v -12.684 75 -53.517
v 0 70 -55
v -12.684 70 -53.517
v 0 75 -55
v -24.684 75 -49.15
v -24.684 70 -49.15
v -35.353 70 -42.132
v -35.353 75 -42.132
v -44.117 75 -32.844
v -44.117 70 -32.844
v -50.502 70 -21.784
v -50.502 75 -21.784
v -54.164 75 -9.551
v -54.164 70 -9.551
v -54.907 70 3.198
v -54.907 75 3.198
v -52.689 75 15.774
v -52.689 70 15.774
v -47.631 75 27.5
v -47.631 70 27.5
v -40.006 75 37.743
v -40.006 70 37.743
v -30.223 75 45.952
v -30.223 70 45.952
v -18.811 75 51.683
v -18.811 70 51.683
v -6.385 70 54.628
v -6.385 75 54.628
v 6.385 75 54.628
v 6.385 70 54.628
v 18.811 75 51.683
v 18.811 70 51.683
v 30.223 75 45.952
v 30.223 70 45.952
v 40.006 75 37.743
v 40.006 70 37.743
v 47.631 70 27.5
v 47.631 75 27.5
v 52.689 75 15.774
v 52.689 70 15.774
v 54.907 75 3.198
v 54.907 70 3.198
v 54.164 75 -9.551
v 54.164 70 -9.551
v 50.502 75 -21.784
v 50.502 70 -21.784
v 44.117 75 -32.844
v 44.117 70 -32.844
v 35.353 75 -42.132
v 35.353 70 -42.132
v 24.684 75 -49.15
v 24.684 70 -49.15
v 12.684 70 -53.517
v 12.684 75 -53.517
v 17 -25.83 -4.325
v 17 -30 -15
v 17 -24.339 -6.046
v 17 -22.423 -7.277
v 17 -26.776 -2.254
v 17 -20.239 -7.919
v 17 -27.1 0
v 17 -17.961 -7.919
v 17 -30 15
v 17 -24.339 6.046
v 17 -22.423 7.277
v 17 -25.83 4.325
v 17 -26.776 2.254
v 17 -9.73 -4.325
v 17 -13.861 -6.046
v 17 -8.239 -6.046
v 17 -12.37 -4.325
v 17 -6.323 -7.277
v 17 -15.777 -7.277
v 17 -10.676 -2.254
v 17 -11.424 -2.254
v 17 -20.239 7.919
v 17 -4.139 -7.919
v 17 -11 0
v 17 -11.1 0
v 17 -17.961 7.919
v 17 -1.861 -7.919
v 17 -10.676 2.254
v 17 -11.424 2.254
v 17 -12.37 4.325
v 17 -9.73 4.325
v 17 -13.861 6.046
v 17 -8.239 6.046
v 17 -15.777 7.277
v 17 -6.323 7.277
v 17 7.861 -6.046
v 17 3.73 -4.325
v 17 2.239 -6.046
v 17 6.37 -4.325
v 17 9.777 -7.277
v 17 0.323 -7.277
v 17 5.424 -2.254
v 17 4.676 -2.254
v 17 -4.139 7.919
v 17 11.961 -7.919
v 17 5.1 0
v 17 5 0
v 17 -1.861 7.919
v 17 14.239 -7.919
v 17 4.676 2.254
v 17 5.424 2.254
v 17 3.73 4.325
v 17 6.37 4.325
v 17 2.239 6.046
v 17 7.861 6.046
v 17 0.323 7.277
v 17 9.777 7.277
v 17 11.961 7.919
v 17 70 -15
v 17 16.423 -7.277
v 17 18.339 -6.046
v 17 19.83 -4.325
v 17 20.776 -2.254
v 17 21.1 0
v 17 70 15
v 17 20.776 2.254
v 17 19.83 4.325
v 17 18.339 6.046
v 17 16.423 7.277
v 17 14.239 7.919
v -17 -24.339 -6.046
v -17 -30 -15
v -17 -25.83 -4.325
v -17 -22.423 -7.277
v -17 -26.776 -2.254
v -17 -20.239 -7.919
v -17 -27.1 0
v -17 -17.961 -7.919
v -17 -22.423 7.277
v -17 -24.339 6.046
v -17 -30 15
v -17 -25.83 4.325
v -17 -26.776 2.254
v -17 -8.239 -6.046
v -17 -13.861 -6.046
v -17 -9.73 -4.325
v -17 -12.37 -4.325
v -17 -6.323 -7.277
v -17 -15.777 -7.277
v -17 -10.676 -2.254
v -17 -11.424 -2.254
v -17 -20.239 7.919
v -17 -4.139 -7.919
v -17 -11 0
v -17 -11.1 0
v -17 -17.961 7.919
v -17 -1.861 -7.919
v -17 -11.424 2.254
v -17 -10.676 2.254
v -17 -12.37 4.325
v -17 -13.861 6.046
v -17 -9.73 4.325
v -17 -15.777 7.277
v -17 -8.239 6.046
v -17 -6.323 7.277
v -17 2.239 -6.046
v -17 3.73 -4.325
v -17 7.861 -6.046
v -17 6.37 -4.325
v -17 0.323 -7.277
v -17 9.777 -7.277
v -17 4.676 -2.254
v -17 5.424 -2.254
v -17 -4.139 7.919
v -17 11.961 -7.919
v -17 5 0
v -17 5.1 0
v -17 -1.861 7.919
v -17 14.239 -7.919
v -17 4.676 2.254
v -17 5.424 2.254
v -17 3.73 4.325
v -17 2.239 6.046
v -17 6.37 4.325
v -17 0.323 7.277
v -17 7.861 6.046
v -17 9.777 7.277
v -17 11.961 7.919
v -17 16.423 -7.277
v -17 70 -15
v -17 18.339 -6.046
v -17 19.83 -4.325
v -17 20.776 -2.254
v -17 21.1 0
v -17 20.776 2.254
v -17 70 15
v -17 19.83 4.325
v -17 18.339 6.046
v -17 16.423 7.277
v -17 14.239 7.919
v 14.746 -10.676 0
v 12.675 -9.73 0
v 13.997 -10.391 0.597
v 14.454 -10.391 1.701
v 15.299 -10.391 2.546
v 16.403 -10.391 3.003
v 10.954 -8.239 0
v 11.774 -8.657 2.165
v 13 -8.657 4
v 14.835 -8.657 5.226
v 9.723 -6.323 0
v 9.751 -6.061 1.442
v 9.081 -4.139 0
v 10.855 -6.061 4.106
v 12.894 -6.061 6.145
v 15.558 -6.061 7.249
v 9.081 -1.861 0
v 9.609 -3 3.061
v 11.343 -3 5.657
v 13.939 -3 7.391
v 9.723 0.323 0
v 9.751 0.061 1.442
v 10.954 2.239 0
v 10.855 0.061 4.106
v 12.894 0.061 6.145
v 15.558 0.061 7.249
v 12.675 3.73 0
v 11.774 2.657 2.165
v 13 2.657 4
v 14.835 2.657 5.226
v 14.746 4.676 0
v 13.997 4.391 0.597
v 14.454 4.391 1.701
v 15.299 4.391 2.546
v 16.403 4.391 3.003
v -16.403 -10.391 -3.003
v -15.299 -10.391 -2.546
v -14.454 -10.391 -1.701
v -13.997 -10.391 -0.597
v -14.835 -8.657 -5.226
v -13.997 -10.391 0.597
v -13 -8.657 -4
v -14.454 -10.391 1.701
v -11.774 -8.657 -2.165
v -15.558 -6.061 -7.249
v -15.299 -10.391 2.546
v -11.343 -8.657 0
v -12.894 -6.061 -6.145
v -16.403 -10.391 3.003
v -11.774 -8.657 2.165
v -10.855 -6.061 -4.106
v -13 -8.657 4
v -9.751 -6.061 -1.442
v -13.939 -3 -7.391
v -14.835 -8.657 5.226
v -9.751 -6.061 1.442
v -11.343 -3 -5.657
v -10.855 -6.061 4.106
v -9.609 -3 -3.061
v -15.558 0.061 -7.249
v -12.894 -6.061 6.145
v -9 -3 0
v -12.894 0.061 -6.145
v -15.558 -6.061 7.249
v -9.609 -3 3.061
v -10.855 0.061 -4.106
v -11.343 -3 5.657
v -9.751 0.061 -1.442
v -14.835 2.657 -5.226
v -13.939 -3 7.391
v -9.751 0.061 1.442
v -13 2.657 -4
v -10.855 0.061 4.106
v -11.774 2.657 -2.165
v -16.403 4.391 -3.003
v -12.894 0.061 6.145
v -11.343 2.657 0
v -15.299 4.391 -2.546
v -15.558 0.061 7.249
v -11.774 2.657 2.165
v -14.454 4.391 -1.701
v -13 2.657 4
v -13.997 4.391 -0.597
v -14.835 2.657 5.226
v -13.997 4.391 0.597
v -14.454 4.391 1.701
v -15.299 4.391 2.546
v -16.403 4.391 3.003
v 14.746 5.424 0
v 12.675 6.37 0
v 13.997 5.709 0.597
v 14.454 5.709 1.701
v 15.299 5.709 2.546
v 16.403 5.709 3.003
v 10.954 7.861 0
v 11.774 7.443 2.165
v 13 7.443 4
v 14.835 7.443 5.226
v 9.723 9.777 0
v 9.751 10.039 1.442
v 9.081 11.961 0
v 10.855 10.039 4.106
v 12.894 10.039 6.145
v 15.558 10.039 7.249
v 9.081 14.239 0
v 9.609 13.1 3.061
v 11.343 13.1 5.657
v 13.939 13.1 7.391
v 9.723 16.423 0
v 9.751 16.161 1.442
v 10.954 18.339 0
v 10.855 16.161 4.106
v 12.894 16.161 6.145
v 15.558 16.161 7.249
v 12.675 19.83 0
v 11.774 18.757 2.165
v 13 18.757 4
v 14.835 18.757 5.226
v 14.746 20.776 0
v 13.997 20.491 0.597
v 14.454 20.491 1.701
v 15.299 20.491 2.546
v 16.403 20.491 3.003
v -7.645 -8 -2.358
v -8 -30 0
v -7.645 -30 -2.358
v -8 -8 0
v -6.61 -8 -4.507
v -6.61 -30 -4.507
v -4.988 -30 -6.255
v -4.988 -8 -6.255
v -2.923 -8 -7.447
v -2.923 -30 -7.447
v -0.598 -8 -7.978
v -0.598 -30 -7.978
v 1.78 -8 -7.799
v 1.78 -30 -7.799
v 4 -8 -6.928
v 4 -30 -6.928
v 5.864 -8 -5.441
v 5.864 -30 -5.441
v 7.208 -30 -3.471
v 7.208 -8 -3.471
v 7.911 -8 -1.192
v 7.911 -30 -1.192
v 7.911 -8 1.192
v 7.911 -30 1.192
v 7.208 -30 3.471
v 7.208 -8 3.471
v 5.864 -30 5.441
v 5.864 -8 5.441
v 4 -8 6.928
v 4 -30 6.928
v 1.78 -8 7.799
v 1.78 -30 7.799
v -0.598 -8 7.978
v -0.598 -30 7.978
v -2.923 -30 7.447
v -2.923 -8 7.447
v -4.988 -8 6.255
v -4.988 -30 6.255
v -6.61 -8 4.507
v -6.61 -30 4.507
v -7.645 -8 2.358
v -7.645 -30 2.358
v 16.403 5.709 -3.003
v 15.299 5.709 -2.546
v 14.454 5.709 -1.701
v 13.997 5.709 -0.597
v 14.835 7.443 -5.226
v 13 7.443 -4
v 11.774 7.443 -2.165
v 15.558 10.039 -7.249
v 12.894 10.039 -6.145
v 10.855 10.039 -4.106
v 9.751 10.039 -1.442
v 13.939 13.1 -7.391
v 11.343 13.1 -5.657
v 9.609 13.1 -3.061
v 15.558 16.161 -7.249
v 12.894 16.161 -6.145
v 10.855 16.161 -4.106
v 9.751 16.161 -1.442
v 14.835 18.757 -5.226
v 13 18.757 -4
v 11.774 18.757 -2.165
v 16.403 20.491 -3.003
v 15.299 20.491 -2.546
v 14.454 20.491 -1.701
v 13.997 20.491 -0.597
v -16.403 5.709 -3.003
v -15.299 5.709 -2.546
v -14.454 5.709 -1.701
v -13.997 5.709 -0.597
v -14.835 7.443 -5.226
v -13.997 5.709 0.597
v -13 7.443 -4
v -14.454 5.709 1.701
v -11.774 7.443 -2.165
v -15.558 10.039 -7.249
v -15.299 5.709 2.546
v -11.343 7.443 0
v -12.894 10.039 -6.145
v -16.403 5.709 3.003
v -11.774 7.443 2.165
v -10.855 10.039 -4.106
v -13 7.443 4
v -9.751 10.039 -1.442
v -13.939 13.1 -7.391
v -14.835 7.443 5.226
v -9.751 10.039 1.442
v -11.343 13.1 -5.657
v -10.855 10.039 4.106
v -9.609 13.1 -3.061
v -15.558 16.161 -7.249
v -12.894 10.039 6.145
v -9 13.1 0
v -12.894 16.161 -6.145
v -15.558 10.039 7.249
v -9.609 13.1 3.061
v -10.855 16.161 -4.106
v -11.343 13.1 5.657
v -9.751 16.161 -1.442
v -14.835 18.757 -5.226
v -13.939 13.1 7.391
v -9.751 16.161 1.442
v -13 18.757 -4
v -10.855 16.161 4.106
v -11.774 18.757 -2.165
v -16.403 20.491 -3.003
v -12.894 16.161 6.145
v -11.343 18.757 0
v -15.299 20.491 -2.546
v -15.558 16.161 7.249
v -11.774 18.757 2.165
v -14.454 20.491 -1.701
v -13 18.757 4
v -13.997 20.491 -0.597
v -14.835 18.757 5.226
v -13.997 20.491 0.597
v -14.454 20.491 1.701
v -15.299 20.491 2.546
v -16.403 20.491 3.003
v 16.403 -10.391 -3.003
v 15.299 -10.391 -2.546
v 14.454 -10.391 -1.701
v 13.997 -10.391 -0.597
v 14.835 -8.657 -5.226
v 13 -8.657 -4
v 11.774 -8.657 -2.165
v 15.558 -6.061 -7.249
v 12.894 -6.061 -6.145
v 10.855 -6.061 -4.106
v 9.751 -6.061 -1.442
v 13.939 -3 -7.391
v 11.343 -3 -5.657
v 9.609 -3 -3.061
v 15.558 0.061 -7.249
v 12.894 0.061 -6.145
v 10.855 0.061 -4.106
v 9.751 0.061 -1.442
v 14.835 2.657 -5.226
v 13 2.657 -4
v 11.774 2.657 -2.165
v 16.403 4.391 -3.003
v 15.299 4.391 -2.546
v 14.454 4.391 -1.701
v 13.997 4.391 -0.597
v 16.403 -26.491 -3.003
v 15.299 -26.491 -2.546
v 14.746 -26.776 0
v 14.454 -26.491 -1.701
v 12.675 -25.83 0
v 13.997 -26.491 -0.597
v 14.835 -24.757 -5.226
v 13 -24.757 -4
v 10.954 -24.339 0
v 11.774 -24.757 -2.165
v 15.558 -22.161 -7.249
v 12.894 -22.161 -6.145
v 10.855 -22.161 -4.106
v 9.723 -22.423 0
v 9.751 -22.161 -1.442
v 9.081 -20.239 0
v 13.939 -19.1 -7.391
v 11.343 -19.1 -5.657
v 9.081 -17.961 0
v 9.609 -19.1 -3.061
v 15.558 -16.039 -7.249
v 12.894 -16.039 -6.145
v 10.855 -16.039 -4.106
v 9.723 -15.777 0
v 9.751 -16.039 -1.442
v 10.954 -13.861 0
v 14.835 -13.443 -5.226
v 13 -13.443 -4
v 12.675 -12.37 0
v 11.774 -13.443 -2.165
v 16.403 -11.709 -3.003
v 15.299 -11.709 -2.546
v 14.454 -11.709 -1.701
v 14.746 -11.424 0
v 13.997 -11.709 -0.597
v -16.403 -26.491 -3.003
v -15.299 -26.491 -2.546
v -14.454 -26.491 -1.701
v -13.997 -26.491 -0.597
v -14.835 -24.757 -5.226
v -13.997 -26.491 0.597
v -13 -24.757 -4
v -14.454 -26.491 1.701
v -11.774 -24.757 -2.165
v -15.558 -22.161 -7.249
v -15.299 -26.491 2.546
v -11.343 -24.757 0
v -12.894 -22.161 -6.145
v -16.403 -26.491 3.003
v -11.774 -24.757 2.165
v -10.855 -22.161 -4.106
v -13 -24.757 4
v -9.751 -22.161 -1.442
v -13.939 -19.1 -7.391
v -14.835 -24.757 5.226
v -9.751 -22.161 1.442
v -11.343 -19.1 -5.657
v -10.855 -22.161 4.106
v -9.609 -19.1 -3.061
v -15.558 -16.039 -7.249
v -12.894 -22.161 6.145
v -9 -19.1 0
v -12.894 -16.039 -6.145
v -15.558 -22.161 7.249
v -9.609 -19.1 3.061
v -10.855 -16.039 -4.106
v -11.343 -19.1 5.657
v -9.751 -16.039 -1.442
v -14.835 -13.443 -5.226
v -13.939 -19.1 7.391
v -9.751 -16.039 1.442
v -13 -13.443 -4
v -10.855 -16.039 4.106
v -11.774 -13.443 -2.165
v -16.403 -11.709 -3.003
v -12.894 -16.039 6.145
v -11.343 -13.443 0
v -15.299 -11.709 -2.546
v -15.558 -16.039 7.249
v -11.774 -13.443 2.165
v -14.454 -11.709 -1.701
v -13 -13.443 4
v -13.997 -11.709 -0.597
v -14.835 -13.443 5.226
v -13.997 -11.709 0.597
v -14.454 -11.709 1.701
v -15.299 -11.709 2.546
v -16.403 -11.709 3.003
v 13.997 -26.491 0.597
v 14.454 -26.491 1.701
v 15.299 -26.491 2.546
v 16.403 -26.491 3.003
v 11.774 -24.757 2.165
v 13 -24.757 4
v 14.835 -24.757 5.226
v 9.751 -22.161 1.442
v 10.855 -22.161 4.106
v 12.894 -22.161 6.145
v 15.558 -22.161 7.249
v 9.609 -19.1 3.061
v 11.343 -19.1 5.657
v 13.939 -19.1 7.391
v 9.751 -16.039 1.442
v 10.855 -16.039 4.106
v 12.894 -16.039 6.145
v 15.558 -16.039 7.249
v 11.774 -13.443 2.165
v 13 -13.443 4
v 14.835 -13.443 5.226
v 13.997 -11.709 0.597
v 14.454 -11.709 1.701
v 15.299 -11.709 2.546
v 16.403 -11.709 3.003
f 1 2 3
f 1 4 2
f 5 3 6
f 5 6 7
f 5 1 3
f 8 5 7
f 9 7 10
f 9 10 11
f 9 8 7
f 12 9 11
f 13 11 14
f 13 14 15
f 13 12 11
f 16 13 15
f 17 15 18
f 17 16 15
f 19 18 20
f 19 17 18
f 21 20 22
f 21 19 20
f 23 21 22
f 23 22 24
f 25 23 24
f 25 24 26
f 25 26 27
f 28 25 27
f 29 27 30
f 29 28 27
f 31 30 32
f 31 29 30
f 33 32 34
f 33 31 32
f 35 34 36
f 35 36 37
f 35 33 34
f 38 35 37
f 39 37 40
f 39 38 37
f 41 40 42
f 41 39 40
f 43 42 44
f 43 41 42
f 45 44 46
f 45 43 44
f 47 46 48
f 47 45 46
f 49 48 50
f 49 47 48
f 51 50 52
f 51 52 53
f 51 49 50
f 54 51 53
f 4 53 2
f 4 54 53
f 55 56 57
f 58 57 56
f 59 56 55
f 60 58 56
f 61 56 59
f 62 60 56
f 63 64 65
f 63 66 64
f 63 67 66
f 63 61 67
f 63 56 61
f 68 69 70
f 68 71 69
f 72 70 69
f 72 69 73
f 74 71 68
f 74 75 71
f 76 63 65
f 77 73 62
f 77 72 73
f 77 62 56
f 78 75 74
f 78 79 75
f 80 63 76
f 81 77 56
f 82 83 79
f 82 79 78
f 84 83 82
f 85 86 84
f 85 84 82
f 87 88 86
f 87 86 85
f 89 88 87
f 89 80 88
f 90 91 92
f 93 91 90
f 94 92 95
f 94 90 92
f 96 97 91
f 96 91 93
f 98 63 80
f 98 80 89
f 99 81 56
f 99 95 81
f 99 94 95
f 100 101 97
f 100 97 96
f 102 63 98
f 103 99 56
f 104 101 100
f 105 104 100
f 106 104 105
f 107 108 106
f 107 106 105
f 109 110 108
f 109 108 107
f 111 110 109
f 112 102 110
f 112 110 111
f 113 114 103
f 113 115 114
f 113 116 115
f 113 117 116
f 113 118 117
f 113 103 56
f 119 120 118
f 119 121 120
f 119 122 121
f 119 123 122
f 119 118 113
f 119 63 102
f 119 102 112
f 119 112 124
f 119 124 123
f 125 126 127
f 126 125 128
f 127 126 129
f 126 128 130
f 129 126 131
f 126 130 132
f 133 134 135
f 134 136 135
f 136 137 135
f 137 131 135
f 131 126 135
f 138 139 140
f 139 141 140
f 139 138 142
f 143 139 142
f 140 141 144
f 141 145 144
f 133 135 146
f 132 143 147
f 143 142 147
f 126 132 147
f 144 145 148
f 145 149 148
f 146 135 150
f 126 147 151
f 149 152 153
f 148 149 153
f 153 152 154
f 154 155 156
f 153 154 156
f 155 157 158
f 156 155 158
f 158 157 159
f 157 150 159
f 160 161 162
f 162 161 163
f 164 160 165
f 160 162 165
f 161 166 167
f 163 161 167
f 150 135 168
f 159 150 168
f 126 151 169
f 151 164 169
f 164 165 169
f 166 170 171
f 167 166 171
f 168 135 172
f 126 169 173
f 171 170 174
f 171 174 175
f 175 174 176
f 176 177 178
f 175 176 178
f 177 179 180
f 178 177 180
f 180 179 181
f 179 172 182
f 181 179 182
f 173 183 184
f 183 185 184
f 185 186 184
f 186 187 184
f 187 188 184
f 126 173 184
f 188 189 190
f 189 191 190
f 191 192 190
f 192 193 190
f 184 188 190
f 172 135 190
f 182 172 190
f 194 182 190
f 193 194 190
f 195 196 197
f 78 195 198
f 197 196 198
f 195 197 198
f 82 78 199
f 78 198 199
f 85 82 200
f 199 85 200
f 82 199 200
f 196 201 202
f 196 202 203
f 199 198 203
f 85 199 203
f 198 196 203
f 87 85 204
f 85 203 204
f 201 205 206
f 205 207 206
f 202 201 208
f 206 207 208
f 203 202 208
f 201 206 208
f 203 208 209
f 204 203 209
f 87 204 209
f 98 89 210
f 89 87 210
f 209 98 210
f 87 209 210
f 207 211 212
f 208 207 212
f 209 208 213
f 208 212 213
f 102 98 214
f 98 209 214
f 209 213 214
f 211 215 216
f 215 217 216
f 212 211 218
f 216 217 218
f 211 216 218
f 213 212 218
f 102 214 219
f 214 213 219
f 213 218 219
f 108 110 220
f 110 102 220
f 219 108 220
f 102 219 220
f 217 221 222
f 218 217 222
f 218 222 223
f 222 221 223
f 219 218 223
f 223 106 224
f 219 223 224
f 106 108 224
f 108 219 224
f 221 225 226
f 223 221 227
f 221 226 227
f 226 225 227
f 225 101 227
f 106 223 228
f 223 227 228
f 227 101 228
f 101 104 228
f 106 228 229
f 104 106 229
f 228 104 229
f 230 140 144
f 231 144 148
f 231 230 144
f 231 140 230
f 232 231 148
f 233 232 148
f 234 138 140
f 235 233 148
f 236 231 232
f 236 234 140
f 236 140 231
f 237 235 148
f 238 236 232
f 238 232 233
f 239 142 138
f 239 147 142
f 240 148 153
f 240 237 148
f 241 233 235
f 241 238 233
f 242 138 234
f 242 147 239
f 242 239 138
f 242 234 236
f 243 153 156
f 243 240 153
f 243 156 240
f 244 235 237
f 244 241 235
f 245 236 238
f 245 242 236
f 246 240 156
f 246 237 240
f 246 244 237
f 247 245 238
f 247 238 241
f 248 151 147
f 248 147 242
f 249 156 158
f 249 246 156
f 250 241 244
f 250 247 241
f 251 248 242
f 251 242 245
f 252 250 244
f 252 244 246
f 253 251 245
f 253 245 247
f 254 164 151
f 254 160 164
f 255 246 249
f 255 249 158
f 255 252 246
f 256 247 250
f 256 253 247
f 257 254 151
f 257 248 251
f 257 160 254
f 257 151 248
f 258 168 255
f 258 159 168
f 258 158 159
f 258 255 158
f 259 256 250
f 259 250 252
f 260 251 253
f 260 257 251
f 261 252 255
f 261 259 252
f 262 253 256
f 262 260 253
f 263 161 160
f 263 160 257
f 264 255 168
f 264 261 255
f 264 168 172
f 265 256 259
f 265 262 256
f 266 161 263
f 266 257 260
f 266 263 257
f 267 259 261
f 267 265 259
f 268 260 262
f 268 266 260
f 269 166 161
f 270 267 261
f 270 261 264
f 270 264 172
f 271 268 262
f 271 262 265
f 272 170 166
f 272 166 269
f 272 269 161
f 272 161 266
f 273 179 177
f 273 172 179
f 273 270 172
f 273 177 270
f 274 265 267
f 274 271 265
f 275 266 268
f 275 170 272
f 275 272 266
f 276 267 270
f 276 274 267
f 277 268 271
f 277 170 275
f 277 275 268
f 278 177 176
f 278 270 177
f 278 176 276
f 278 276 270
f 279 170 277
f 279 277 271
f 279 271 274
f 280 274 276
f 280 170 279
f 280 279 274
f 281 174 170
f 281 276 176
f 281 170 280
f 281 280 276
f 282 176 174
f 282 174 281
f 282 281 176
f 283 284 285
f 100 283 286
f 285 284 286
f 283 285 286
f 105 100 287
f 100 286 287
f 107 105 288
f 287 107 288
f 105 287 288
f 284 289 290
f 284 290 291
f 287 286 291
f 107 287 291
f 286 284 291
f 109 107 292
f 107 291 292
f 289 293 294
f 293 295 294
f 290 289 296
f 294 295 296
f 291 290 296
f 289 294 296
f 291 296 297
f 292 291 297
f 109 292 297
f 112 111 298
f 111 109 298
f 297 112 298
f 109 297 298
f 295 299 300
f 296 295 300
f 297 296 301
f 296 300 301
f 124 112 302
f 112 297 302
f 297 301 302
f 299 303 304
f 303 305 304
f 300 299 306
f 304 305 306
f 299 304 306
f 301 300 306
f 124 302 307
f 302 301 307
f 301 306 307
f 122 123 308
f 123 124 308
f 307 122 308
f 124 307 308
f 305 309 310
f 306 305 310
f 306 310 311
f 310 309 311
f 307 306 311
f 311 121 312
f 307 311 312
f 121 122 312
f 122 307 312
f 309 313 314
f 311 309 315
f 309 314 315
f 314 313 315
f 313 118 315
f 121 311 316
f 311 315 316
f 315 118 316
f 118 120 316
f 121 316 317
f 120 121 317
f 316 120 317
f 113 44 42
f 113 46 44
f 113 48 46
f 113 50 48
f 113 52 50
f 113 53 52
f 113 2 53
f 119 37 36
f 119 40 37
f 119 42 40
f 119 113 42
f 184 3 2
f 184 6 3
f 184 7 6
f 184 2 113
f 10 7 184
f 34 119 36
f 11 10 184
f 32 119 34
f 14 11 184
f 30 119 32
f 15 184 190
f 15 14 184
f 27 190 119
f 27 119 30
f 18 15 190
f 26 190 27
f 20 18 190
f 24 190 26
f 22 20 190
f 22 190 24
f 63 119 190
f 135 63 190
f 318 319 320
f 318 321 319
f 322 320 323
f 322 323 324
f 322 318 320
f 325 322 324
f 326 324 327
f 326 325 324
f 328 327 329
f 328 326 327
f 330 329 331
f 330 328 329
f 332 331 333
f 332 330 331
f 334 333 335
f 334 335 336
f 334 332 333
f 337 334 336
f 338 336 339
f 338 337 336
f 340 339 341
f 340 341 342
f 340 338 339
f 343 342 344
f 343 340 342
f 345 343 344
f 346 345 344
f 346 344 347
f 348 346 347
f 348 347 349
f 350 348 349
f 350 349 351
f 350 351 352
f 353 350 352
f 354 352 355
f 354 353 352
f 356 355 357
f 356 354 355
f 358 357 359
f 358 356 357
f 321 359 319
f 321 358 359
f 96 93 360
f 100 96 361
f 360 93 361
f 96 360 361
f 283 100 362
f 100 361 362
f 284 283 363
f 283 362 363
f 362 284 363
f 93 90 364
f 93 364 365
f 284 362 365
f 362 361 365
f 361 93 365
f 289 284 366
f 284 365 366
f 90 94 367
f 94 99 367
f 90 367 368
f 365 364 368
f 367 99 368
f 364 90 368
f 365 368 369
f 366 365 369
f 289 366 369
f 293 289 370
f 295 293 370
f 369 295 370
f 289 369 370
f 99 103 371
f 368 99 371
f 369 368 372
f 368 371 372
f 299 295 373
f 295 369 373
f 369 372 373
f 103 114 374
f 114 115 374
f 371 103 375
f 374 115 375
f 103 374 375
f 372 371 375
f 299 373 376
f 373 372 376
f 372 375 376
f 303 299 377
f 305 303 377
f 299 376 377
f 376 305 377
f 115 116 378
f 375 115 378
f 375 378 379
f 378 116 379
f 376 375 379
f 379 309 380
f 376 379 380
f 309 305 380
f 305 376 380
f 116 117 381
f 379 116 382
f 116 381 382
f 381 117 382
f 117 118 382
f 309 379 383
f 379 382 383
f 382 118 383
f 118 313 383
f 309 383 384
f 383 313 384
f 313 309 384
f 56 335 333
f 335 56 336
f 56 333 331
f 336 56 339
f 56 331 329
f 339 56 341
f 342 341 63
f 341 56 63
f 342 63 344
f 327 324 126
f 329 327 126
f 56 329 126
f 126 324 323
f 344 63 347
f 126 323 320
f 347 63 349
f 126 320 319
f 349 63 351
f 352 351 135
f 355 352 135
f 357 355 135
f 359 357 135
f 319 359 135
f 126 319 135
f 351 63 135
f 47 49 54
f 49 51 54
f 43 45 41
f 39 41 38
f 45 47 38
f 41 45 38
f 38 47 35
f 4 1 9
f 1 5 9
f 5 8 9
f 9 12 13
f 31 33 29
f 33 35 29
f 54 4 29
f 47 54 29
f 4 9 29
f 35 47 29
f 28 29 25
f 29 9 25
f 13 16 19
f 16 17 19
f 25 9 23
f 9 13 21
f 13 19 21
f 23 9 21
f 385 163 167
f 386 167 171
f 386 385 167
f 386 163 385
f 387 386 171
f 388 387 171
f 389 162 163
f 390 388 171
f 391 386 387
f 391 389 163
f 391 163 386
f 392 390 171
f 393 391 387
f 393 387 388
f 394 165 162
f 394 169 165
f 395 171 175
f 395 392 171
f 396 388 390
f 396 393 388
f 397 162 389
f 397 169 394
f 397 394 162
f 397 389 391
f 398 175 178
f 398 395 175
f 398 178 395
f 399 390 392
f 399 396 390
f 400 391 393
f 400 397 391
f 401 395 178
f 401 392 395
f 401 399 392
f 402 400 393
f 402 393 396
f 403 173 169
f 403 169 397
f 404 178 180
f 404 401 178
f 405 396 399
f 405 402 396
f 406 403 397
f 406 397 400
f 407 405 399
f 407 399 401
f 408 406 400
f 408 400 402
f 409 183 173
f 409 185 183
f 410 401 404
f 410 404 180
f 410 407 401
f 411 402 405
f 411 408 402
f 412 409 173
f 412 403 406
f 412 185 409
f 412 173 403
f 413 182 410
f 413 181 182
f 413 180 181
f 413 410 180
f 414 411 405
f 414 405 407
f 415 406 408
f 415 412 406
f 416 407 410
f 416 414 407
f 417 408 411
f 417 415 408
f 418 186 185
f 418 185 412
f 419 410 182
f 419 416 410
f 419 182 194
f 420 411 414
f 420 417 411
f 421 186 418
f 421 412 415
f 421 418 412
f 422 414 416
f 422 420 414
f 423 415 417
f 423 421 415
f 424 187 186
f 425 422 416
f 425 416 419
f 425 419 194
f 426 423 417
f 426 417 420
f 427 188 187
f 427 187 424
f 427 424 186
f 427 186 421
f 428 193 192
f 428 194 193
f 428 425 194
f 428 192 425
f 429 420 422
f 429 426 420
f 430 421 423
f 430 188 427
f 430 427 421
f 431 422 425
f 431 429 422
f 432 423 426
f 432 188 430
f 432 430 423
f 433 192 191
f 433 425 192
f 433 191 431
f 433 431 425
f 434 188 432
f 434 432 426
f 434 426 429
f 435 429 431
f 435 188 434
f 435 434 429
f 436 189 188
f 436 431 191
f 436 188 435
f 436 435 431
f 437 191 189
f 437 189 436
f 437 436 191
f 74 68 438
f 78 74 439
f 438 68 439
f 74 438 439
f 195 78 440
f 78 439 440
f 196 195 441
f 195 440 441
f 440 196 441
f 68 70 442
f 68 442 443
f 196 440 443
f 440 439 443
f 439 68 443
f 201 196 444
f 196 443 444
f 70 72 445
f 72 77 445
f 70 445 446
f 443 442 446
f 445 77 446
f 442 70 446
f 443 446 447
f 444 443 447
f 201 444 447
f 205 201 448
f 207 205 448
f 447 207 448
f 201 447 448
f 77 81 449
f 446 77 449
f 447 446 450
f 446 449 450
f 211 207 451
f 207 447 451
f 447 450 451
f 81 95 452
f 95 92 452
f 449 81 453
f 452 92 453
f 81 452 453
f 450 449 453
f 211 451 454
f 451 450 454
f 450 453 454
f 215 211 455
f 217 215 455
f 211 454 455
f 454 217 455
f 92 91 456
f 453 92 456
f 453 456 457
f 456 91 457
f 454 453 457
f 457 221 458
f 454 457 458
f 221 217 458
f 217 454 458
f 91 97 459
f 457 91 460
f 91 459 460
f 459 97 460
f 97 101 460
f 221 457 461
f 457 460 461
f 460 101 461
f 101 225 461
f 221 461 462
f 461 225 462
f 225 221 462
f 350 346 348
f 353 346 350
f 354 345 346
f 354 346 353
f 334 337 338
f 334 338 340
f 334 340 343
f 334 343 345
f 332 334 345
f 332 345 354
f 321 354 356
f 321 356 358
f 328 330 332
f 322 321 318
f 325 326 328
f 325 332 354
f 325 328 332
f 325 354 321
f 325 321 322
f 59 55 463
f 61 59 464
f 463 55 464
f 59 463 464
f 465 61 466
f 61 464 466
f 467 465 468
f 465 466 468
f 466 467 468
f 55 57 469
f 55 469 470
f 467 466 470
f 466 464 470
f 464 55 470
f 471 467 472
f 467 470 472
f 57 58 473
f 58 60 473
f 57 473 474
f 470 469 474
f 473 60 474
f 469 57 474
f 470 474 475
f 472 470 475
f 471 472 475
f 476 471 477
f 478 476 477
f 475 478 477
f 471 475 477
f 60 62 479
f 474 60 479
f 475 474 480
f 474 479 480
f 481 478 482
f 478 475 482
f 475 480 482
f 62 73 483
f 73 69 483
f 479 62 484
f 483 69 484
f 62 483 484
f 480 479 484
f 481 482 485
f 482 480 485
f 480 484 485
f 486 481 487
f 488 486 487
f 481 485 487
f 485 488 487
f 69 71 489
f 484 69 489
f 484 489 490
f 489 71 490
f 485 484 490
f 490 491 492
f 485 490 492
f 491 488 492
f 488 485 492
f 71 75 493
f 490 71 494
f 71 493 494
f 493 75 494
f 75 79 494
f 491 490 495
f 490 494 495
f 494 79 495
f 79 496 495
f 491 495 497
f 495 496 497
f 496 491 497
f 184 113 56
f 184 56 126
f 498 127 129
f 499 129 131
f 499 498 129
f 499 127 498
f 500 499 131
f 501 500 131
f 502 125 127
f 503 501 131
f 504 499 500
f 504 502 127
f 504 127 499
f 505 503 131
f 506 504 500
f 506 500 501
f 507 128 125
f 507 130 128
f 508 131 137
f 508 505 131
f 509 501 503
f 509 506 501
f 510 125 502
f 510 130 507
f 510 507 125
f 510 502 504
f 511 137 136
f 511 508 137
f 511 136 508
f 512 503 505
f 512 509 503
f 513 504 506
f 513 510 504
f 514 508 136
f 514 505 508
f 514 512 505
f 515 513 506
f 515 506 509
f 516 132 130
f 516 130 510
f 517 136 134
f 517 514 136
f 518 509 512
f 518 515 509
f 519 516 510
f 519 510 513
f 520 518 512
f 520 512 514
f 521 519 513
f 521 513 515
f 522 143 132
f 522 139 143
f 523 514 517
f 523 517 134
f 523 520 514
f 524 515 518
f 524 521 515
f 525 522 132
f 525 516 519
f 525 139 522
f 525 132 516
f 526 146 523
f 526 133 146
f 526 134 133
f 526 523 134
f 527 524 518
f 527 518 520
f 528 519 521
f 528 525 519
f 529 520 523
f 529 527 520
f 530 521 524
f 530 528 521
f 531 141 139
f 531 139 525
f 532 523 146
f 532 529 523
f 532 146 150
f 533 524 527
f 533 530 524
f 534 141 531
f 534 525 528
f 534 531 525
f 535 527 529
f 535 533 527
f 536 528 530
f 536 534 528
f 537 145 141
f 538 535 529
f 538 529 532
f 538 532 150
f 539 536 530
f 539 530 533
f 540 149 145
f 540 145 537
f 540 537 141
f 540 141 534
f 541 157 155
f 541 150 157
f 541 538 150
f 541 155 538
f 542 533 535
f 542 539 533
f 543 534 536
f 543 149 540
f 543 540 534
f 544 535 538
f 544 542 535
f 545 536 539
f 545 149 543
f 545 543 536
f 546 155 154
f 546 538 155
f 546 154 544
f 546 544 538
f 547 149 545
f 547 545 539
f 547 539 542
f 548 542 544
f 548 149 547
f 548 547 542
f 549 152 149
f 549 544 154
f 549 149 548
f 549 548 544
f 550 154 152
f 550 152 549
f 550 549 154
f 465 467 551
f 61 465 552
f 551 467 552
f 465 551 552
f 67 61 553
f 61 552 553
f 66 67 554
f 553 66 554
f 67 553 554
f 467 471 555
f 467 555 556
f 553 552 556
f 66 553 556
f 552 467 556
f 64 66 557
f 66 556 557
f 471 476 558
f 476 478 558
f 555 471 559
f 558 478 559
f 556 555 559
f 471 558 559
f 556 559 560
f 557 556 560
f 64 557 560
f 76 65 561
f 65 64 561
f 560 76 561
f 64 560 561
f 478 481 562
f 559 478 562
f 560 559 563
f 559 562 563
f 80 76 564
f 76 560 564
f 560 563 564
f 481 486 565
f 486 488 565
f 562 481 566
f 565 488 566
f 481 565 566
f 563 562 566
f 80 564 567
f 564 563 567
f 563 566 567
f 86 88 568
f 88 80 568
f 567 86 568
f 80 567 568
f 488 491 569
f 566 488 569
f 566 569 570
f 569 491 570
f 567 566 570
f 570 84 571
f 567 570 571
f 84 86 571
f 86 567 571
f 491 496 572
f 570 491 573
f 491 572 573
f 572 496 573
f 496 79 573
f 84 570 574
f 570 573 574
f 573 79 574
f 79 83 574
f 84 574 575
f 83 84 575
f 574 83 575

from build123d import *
from build123d.topology import SkipClean

# Parameters (mm, degrees)
SKETCH_5_W                 = 17
SKETCH_5_H                 = 100
EXTRUDE_1_DEPTH            = 15
PATTERN_LINEAR_1_COUNT     = 2
PATTERN_LINEAR_1_PITCH     = 16.1
PATTERN_LINEAR_1_COL_COUNT = 2
PATTERN_LINEAR_1_COL_PITCH = 16.1
SKETCH_8_W                 = 8
SKETCH_8_H                 = 22
SKETCH_9_W                 = 55
SKETCH_9_H                 = 5


with BuildPart() as part:
    # 草图5 → 凸台-拉伸1 (new, symmetric)
    with BuildSketch(Plane.XY):
        with Locations((-8.5, 20)):
            Rectangle(SKETCH_5_W, SKETCH_5_H)
    extrude_1 = extrude(amount=EXTRUDE_1_DEPTH, both=True)

    # 草图7 → 切除-旋转1 (revolve, cut)
    with BuildSketch(Plane.XY):
        with BuildLine():
            Line((-17, 5), (-17, -11))
            ThreePointArc((-17, -11), (-9, -3), (-17, 5))
        make_face()
    cut_revolve_1 = revolve(axis=Axis((-17, 5, 0), (0, -1, 0)), mode=Mode.SUBTRACT)

    # 阵列(线性)1: 切除-旋转1 ×2
    with Locations(*[(0, i * PATTERN_LINEAR_1_PITCH, 0) for i in range(1, PATTERN_LINEAR_1_COUNT)]):
        add(cut_revolve_1, mode=Mode.SUBTRACT)

    # 阵列(线性)1 col: 切除-旋转1 ×2
    with Locations(*[(0, -i * PATTERN_LINEAR_1_COL_PITCH, 0) for i in range(1, PATTERN_LINEAR_1_COL_COUNT)]):
        add(cut_revolve_1, mode=Mode.SUBTRACT)

    # 镜向2: 凸台-拉伸1 across plane
    add(extrude_1.mirror(Plane(origin=(0, 0, 0), x_dir=(0, 0, 1), z_dir=(1, 0, 0))))

    # 镜向3: 切除-旋转1 across plane
    with SkipClean():  # the faces are left unmerged after this step: merging them gives an invalid solid
        add(cut_revolve_1.mirror(Plane(origin=(0, 0, 0), x_dir=(0, 0, 1), z_dir=(1, 0, 0))), mode=Mode.SUBTRACT)

    # 镜向4 copy 1 sketch → 镜向4 copy 1 (revolve, cut)
    with SkipClean():  # the faces are left unmerged after this step: merging them gives an invalid solid
        with BuildSketch(Plane(origin=(0, 16.1, 0), x_dir=(-1, 0, 0), z_dir=(0, 0, 1))):
            with BuildLine():
                Line((-17, -5), (-17, 11))
                ThreePointArc((-17, 11), (-9, 3), (-17, -5))
            make_face()
        revolve(axis=Axis((17, 21.1, 0), (0, 1, 0)), mode=Mode.SUBTRACT)

    # 镜向4 copy 2 sketch → 镜向4 copy 2 (revolve, cut)
    with SkipClean():  # the faces are left unmerged after this step: merging them gives an invalid solid
        with BuildSketch(Plane(origin=(0, -16.1, 0), x_dir=(-1, 0, 0), z_dir=(0, 0, 1))):
            with BuildLine():
                Line((-17, -5), (-17, 11))
                ThreePointArc((-17, 11), (-9, 3), (-17, -5))
            make_face()
        revolve(axis=Axis((17, -11.1, 0), (0, 1, 0)), mode=Mode.SUBTRACT)

    # 镜向4 copy 3 sketch → 镜向4 copy 3 (revolve, cut)
    with SkipClean():  # the faces are left unmerged after this step: merging them gives an invalid solid
        with BuildSketch(Plane(origin=(0, 0, 0), x_dir=(-1, 0, 0), z_dir=(0, 0, 1))):
            with BuildLine():
                Line((-17, -5), (-17, 11))
                ThreePointArc((-17, 11), (-9, 3), (-17, -5))
            make_face()
        revolve(axis=Axis((17, 5, 0), (0, 1, 0)), mode=Mode.SUBTRACT)

    # 草图8 → 切除-旋转2 (revolve, cut)
    with SkipClean():  # the faces are left unmerged after this step: merging them gives an invalid solid
        with BuildSketch(Plane.XY):
            with Locations((-4, -19)):
                Rectangle(SKETCH_8_W, SKETCH_8_H)
        revolve(axis=Axis((0, -8, 0), (0, -1, 0)), mode=Mode.SUBTRACT)

    # 草图9 → 旋转1 (revolve)
    with SkipClean():  # the faces are left unmerged after this step: merging them gives an invalid solid
        with BuildSketch(Plane.XY):
            with Locations((27.5, 72.5)):
                Rectangle(SKETCH_9_W, SKETCH_9_H)
        revolve(axis=Axis((0, 70, 0), (0, 1, 0)))


solid = part.part
